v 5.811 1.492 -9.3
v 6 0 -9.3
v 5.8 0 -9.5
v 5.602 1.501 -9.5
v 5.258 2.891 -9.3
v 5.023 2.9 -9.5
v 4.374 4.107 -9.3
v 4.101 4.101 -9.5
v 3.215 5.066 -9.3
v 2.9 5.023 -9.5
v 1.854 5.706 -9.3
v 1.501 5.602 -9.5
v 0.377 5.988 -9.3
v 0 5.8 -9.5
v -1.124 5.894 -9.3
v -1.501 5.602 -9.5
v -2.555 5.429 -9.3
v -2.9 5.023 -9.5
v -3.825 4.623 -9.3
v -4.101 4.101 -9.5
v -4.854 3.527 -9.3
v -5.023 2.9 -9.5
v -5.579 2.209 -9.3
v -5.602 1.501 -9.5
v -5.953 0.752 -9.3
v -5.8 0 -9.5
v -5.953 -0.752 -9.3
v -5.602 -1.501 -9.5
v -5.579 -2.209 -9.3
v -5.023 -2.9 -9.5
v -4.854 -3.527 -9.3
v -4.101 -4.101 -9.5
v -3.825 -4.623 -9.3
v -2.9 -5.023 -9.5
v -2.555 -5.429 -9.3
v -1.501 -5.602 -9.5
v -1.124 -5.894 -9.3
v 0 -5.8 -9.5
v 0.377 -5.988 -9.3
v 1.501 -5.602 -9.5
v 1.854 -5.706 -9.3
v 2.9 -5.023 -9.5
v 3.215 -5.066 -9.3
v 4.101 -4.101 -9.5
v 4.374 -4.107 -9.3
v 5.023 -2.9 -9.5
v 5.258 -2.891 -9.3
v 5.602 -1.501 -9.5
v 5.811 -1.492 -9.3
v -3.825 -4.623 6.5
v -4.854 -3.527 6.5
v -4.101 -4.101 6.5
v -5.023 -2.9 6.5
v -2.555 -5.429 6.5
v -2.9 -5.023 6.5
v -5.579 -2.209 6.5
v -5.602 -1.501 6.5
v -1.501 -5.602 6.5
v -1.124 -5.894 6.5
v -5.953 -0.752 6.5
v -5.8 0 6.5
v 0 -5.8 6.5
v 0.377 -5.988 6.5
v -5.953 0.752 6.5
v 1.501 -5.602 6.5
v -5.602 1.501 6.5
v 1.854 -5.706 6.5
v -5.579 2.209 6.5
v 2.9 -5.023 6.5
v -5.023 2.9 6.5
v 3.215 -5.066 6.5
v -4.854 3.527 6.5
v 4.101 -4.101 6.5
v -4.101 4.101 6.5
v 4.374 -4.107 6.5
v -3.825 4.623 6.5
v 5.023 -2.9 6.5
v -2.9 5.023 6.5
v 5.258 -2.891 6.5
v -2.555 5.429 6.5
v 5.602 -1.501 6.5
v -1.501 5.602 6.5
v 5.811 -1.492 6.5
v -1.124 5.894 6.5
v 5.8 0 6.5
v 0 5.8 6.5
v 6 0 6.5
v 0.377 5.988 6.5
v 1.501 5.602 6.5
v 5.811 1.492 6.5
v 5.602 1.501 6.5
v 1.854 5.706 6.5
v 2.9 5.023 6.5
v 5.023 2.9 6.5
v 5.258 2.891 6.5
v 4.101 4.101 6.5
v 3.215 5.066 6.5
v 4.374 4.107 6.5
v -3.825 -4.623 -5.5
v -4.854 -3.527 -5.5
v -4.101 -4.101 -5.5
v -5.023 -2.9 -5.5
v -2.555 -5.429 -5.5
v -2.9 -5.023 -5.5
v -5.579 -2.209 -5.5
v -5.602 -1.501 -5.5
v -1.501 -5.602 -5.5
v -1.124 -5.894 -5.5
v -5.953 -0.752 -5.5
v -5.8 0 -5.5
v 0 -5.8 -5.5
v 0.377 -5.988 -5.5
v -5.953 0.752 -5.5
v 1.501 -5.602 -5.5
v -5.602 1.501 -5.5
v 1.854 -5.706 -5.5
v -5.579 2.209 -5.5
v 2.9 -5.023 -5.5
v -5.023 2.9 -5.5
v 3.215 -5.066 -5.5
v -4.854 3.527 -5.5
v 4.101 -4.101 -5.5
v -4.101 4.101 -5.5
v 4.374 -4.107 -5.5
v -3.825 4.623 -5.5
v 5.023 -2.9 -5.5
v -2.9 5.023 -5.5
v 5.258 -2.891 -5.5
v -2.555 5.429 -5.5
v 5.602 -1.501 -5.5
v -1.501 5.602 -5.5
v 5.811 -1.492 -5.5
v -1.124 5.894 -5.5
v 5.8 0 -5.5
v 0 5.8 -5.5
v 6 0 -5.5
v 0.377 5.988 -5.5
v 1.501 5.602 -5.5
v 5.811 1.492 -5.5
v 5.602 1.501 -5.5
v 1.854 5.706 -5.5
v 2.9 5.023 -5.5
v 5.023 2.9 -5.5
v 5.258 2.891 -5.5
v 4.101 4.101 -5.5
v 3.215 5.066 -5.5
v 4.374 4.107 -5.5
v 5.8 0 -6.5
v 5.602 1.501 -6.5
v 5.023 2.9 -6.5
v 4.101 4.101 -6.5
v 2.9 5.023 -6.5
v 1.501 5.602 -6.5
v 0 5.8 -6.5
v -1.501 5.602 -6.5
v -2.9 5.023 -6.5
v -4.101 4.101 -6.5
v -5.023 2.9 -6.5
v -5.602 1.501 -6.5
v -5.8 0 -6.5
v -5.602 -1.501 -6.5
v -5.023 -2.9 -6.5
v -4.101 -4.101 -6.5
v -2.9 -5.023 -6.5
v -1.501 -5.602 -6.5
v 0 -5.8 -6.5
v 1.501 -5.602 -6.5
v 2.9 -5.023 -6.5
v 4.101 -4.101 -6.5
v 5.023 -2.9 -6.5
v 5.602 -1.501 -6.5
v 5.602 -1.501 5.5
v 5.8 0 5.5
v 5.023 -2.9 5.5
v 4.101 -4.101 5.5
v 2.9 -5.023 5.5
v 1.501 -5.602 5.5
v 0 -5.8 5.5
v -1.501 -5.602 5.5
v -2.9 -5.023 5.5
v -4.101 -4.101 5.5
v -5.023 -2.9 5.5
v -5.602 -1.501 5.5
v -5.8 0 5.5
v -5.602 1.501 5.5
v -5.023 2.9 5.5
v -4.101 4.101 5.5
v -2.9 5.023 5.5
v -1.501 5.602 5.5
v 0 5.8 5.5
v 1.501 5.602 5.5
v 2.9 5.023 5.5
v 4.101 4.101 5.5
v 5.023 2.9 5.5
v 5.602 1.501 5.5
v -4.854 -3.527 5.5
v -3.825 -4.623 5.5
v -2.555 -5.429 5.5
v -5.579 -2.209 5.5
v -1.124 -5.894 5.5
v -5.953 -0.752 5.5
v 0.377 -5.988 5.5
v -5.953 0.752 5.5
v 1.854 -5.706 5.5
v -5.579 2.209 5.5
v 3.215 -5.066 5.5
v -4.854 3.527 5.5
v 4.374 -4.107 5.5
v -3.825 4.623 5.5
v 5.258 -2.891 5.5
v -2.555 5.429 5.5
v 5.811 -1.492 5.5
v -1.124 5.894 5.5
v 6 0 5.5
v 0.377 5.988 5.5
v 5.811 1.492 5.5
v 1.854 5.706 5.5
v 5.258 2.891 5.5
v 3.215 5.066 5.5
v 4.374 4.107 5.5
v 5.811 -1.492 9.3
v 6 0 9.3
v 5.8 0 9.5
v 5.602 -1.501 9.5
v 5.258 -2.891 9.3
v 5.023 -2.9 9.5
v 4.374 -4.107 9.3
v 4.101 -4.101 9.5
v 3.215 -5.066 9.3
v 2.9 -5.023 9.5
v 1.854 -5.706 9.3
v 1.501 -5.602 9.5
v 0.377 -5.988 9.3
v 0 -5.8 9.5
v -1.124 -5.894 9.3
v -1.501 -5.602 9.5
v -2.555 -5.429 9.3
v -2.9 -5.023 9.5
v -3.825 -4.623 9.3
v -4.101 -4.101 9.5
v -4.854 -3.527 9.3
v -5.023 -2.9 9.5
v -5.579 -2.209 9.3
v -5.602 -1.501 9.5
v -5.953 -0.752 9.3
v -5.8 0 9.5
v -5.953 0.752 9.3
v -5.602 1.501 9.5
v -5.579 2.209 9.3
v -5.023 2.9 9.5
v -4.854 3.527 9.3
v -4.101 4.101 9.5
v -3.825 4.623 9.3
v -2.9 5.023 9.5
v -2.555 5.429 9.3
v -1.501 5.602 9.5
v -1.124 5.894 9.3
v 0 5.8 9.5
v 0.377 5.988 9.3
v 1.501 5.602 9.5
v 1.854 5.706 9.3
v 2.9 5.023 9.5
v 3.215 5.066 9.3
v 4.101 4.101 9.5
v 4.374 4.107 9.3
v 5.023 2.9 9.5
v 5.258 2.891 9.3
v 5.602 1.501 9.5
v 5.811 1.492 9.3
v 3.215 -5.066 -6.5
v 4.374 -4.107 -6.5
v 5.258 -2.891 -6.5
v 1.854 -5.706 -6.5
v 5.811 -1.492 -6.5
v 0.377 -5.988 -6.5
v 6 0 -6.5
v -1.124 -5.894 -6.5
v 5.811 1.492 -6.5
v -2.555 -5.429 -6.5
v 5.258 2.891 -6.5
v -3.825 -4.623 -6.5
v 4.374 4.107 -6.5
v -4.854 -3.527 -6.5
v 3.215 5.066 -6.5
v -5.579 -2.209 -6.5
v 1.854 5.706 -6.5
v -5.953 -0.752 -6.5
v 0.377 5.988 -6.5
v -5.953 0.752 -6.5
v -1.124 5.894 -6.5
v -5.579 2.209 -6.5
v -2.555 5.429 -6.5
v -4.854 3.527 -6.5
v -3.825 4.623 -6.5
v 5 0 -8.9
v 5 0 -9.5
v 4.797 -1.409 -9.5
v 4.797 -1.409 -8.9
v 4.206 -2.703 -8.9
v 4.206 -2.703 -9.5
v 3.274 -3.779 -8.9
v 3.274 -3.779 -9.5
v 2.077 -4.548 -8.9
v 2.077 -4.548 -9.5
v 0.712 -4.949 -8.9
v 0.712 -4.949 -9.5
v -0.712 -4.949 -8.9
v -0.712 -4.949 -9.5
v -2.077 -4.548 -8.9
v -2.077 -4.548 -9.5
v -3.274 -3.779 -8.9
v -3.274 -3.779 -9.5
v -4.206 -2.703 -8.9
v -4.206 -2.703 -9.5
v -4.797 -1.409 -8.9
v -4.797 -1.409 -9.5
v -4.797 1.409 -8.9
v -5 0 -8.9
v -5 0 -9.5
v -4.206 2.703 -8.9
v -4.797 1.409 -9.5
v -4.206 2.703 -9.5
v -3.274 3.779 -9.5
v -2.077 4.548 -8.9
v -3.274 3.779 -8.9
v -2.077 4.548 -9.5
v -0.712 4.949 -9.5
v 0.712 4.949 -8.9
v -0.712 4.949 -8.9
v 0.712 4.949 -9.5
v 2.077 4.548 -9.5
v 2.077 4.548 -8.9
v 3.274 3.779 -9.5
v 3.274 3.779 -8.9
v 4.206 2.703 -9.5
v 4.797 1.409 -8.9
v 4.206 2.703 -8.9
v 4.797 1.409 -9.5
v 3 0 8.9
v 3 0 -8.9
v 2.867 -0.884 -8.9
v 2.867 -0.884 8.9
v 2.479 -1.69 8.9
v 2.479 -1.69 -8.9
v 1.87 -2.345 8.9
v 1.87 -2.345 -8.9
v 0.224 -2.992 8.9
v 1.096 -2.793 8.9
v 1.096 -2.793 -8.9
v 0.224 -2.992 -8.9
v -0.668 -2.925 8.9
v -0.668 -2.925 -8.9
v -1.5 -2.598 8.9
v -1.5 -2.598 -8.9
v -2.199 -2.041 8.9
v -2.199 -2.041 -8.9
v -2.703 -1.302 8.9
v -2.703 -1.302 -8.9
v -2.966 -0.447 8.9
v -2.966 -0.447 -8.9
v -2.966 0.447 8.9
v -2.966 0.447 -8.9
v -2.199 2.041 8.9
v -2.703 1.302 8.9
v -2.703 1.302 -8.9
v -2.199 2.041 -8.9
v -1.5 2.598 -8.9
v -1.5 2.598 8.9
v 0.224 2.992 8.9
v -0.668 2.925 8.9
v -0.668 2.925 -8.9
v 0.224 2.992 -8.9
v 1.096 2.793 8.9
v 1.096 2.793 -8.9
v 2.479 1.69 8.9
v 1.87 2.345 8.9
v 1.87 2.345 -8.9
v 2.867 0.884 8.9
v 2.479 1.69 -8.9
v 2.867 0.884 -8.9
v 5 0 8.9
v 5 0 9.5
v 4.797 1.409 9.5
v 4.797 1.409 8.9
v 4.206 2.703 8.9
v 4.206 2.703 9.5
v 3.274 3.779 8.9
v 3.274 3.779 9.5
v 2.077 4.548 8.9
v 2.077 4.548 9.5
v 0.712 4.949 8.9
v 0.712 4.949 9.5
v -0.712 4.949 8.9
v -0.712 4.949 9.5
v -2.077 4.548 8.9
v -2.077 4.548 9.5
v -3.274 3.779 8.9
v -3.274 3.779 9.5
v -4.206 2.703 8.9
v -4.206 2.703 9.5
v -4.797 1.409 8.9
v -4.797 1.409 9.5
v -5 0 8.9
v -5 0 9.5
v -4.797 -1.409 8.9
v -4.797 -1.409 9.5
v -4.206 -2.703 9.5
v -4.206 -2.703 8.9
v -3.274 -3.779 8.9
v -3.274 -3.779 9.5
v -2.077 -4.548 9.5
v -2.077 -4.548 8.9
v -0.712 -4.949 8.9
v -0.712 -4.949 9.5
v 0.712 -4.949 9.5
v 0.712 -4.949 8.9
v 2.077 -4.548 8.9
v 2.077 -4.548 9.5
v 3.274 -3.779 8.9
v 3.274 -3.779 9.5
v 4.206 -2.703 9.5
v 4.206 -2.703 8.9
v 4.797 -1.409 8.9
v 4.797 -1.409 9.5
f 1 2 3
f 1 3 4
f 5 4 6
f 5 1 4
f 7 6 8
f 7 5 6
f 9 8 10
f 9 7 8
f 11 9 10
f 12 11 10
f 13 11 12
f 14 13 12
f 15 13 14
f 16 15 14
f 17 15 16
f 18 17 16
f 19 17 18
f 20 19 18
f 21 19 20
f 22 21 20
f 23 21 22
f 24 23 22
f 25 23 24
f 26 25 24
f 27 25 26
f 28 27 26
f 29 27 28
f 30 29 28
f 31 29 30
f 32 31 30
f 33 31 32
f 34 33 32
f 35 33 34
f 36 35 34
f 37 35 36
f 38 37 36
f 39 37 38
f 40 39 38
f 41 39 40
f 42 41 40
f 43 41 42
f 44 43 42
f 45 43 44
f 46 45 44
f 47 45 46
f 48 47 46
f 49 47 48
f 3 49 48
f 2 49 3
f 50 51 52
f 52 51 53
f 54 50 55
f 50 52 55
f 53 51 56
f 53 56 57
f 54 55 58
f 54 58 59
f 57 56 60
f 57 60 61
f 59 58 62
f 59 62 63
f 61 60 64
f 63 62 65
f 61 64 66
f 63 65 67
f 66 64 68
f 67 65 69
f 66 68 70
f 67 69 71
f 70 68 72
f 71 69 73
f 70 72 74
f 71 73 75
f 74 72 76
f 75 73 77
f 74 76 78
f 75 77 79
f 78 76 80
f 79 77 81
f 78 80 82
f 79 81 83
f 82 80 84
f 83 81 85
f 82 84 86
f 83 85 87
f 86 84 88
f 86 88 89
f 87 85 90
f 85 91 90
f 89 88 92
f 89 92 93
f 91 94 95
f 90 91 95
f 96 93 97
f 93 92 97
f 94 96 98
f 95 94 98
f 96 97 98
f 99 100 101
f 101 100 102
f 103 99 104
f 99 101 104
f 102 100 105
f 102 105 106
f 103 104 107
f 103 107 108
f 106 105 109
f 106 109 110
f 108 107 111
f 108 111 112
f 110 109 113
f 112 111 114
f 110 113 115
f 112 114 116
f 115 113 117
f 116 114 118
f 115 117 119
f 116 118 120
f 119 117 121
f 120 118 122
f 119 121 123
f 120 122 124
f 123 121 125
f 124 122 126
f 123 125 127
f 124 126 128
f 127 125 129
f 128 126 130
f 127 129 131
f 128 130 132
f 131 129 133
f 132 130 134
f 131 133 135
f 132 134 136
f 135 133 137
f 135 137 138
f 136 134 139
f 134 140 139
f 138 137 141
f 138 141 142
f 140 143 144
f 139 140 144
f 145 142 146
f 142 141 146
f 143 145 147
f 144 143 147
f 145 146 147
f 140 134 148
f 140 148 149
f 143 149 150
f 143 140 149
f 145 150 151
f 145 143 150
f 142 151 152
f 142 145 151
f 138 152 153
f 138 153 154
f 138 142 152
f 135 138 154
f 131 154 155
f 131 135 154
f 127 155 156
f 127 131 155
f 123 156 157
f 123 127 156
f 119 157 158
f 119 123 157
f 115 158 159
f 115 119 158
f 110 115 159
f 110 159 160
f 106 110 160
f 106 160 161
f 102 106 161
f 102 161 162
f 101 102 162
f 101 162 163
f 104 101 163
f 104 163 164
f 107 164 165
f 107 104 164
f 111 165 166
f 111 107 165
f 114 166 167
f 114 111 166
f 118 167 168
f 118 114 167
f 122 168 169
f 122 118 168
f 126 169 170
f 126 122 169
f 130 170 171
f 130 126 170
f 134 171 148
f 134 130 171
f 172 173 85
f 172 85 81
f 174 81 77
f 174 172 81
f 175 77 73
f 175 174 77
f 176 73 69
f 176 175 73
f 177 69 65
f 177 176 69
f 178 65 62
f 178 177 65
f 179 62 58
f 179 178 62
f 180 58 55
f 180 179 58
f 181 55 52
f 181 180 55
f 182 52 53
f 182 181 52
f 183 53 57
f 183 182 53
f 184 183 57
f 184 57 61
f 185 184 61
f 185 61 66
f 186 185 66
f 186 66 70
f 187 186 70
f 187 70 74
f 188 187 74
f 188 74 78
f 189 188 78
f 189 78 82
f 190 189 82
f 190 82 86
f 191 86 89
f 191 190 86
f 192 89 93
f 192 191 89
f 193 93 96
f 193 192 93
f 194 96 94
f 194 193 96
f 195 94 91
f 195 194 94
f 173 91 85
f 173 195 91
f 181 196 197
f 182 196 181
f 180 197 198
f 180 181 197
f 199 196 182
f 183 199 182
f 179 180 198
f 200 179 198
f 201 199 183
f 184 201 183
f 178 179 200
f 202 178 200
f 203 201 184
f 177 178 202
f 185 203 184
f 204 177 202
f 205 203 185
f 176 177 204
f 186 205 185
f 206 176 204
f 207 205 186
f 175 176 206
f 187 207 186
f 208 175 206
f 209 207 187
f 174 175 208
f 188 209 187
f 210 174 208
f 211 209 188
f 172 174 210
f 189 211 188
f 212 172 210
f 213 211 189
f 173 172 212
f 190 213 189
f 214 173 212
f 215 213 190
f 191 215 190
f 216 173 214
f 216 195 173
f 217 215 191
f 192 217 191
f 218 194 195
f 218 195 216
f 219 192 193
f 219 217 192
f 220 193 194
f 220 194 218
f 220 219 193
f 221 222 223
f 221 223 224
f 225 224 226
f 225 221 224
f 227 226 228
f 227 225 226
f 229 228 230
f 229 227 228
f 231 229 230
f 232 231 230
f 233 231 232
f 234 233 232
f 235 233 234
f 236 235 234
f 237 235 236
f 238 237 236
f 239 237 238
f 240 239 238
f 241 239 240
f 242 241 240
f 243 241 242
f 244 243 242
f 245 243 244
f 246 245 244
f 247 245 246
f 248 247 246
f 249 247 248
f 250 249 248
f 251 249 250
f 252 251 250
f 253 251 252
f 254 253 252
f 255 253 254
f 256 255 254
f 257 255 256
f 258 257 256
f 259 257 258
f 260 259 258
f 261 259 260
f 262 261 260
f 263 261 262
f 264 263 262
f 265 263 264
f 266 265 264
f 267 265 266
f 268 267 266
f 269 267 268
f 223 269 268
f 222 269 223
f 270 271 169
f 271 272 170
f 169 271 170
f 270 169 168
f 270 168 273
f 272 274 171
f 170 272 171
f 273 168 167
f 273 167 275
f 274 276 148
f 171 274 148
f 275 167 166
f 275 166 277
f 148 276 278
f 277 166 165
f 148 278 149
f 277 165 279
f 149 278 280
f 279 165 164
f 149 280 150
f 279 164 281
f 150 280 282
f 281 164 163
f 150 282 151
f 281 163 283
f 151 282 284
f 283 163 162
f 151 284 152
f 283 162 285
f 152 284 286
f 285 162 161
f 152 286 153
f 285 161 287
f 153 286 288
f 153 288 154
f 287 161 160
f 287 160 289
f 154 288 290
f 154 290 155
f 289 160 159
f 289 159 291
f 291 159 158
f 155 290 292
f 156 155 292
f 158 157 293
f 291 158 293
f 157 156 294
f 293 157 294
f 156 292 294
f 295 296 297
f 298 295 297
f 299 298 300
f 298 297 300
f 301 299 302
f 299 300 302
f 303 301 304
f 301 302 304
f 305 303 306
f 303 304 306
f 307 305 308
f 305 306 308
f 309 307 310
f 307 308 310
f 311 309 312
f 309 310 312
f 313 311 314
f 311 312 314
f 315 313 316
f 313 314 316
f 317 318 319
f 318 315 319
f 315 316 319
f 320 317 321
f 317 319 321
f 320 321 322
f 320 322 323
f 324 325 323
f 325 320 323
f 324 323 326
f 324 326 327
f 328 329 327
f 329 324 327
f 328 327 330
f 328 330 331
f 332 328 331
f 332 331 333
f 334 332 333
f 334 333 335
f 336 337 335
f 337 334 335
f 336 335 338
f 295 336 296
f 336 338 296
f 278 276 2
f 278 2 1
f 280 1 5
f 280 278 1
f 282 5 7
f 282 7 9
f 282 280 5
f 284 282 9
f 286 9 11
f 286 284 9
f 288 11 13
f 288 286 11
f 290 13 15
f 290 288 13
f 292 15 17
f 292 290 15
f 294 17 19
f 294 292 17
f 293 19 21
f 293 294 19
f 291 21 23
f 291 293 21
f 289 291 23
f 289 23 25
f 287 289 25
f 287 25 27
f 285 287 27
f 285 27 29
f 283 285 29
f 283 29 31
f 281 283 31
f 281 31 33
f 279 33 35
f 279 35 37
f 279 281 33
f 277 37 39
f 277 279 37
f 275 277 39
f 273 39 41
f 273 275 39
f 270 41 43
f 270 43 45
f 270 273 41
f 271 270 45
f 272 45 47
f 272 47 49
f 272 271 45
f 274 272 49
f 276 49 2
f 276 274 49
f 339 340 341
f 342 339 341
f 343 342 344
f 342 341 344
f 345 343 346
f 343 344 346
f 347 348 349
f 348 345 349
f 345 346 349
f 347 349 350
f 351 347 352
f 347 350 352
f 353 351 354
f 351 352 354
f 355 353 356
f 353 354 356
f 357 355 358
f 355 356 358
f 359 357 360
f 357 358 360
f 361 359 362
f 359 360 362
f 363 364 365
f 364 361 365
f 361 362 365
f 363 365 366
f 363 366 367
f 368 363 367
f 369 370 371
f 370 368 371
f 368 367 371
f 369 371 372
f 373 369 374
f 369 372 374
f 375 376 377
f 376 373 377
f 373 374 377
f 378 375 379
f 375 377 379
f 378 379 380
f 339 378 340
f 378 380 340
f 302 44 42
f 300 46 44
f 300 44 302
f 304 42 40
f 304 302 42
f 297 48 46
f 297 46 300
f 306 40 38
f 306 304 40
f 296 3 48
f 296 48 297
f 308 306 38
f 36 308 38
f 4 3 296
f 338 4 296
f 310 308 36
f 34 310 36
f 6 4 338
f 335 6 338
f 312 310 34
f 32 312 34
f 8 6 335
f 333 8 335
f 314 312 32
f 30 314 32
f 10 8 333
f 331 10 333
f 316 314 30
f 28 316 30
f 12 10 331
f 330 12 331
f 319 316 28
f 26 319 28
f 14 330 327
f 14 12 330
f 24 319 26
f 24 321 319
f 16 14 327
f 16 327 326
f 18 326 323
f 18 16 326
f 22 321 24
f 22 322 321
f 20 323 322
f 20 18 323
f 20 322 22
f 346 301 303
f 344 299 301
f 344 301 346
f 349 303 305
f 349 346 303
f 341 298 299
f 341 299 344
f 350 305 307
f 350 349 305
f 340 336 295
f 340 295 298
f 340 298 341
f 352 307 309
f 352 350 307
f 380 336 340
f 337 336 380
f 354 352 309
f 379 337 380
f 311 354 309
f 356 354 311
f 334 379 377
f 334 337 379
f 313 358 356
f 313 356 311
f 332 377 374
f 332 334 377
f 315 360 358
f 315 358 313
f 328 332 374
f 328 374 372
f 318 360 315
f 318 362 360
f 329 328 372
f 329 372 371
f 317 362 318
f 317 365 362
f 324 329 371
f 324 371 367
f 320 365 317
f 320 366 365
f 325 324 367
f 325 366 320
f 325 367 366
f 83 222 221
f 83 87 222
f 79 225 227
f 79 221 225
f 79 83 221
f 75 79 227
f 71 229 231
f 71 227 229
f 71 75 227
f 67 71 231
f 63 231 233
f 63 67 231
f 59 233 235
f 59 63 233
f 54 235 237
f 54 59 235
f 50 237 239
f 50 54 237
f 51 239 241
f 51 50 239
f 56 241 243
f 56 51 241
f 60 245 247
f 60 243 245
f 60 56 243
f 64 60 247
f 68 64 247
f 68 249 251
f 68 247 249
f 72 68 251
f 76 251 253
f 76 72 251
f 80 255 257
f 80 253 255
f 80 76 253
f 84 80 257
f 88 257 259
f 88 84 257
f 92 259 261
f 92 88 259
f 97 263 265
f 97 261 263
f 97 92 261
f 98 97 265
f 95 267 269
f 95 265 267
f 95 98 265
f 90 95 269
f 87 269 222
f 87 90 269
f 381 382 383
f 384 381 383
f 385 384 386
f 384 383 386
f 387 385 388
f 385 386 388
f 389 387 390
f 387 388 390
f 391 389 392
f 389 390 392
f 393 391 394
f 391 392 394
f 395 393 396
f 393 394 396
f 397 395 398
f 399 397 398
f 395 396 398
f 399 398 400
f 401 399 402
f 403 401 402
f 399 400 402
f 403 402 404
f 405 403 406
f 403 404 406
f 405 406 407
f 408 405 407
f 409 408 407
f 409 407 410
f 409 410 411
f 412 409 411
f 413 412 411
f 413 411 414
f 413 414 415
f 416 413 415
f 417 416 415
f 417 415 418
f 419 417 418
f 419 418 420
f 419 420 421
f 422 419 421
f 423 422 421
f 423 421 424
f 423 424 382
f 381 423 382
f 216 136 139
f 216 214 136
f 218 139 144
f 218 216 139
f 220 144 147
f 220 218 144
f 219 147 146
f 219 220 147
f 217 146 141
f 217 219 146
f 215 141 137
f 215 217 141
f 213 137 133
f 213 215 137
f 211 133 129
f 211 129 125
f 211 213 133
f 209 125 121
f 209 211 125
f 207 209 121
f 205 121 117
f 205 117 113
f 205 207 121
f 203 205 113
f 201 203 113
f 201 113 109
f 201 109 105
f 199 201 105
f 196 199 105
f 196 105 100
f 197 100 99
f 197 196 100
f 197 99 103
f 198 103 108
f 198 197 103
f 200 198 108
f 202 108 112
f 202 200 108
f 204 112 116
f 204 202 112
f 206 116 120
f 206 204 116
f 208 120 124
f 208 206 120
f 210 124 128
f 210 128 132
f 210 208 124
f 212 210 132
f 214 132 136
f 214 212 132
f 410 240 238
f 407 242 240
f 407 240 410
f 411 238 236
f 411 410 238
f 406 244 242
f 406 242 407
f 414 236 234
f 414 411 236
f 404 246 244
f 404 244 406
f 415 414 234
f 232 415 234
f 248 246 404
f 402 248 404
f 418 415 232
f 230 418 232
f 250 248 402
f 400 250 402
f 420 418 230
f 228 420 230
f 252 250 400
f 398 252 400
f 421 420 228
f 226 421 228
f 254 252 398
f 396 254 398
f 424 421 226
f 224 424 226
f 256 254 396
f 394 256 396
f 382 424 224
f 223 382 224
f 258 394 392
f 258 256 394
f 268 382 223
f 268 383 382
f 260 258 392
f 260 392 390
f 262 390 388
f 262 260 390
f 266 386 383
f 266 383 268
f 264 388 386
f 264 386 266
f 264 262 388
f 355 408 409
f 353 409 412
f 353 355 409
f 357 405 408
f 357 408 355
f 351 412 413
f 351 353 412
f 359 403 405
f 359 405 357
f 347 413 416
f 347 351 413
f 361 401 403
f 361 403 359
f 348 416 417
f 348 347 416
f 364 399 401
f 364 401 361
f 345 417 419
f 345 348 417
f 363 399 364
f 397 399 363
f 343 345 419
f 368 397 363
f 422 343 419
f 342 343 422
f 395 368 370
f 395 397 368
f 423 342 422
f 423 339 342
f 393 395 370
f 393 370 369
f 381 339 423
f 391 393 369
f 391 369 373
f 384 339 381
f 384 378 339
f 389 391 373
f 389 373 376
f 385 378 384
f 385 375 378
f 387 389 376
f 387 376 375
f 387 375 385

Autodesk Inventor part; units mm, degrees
ref_plane "YZ Plane" through (0, 0, 0) normal (1, 0, 0) x (0, 1, 0)
ref_plane "XZ Plane" through (0, 0, 0) normal (0, 1, 0) x (-1, 0, 0)
ref_plane "XY Plane" through (0, 0, 0) normal (0, 0, 1) x (1, 0, 0)
sketch "Эскиз1" plane through (0, 0, 0) normal (0, 0, 1) x (1, 0, 0)
  circle A0 centre (0, 0) radius 6
  dimension "d0" = 12
extrude "Выдавливание1" add sketch "Эскиз1" along normal mid plane 11
sketch "Эскиз2" plane through (0, 0, 5.5) normal (0, 0, 1) x (1, 0, 0)
  circle A0 centre (0, 0) radius 5.8
  dimension "d3" = 11.6
extrude "Выдавливание2" add sketch "Эскиз2" along normal blind 1
sketch "Эскиз3" plane through (0, 0, 6.5) normal (0, 0, 1) x (1, 0, 0)
  circle A0 centre (0, 0) radius 6 projected
extrude "Выдавливание3" add sketch "Эскиз3" along normal blind 3
sketch "Эскиз4" plane through (0, 0, 9.5) normal (0, 0, 1) x (1, 0, 0)
  circle A0 centre (0, 0) radius 5
  dimension "d8" = 10
extrude "Выдавливание4" cut sketch "Эскиз4" against normal blind 0.6
sketch "Эскиз5" plane through (0, 0, 8.9) normal (0, 0, 1) x (1, 0, 0)
  circle A0 centre (0, 0) radius 3
  dimension "d11" = 6
extrude "Выдавливание5" cut sketch "Эскиз5" against normal through all
chamfer "Фаска1" distance 0.2 angle 45 1 edges at (-6, 0, 9.5)
mirror "Зеркальное отражение1" about plane through (0, 0, 0) normal (0, 0, 1) of "Выдавливание3", "Выдавливание4", "Выдавливание5", "Фаска1", "Выдавливание2"
properties part number "LM6UU" material "Сталь, нержавеющая, аустенитная"
